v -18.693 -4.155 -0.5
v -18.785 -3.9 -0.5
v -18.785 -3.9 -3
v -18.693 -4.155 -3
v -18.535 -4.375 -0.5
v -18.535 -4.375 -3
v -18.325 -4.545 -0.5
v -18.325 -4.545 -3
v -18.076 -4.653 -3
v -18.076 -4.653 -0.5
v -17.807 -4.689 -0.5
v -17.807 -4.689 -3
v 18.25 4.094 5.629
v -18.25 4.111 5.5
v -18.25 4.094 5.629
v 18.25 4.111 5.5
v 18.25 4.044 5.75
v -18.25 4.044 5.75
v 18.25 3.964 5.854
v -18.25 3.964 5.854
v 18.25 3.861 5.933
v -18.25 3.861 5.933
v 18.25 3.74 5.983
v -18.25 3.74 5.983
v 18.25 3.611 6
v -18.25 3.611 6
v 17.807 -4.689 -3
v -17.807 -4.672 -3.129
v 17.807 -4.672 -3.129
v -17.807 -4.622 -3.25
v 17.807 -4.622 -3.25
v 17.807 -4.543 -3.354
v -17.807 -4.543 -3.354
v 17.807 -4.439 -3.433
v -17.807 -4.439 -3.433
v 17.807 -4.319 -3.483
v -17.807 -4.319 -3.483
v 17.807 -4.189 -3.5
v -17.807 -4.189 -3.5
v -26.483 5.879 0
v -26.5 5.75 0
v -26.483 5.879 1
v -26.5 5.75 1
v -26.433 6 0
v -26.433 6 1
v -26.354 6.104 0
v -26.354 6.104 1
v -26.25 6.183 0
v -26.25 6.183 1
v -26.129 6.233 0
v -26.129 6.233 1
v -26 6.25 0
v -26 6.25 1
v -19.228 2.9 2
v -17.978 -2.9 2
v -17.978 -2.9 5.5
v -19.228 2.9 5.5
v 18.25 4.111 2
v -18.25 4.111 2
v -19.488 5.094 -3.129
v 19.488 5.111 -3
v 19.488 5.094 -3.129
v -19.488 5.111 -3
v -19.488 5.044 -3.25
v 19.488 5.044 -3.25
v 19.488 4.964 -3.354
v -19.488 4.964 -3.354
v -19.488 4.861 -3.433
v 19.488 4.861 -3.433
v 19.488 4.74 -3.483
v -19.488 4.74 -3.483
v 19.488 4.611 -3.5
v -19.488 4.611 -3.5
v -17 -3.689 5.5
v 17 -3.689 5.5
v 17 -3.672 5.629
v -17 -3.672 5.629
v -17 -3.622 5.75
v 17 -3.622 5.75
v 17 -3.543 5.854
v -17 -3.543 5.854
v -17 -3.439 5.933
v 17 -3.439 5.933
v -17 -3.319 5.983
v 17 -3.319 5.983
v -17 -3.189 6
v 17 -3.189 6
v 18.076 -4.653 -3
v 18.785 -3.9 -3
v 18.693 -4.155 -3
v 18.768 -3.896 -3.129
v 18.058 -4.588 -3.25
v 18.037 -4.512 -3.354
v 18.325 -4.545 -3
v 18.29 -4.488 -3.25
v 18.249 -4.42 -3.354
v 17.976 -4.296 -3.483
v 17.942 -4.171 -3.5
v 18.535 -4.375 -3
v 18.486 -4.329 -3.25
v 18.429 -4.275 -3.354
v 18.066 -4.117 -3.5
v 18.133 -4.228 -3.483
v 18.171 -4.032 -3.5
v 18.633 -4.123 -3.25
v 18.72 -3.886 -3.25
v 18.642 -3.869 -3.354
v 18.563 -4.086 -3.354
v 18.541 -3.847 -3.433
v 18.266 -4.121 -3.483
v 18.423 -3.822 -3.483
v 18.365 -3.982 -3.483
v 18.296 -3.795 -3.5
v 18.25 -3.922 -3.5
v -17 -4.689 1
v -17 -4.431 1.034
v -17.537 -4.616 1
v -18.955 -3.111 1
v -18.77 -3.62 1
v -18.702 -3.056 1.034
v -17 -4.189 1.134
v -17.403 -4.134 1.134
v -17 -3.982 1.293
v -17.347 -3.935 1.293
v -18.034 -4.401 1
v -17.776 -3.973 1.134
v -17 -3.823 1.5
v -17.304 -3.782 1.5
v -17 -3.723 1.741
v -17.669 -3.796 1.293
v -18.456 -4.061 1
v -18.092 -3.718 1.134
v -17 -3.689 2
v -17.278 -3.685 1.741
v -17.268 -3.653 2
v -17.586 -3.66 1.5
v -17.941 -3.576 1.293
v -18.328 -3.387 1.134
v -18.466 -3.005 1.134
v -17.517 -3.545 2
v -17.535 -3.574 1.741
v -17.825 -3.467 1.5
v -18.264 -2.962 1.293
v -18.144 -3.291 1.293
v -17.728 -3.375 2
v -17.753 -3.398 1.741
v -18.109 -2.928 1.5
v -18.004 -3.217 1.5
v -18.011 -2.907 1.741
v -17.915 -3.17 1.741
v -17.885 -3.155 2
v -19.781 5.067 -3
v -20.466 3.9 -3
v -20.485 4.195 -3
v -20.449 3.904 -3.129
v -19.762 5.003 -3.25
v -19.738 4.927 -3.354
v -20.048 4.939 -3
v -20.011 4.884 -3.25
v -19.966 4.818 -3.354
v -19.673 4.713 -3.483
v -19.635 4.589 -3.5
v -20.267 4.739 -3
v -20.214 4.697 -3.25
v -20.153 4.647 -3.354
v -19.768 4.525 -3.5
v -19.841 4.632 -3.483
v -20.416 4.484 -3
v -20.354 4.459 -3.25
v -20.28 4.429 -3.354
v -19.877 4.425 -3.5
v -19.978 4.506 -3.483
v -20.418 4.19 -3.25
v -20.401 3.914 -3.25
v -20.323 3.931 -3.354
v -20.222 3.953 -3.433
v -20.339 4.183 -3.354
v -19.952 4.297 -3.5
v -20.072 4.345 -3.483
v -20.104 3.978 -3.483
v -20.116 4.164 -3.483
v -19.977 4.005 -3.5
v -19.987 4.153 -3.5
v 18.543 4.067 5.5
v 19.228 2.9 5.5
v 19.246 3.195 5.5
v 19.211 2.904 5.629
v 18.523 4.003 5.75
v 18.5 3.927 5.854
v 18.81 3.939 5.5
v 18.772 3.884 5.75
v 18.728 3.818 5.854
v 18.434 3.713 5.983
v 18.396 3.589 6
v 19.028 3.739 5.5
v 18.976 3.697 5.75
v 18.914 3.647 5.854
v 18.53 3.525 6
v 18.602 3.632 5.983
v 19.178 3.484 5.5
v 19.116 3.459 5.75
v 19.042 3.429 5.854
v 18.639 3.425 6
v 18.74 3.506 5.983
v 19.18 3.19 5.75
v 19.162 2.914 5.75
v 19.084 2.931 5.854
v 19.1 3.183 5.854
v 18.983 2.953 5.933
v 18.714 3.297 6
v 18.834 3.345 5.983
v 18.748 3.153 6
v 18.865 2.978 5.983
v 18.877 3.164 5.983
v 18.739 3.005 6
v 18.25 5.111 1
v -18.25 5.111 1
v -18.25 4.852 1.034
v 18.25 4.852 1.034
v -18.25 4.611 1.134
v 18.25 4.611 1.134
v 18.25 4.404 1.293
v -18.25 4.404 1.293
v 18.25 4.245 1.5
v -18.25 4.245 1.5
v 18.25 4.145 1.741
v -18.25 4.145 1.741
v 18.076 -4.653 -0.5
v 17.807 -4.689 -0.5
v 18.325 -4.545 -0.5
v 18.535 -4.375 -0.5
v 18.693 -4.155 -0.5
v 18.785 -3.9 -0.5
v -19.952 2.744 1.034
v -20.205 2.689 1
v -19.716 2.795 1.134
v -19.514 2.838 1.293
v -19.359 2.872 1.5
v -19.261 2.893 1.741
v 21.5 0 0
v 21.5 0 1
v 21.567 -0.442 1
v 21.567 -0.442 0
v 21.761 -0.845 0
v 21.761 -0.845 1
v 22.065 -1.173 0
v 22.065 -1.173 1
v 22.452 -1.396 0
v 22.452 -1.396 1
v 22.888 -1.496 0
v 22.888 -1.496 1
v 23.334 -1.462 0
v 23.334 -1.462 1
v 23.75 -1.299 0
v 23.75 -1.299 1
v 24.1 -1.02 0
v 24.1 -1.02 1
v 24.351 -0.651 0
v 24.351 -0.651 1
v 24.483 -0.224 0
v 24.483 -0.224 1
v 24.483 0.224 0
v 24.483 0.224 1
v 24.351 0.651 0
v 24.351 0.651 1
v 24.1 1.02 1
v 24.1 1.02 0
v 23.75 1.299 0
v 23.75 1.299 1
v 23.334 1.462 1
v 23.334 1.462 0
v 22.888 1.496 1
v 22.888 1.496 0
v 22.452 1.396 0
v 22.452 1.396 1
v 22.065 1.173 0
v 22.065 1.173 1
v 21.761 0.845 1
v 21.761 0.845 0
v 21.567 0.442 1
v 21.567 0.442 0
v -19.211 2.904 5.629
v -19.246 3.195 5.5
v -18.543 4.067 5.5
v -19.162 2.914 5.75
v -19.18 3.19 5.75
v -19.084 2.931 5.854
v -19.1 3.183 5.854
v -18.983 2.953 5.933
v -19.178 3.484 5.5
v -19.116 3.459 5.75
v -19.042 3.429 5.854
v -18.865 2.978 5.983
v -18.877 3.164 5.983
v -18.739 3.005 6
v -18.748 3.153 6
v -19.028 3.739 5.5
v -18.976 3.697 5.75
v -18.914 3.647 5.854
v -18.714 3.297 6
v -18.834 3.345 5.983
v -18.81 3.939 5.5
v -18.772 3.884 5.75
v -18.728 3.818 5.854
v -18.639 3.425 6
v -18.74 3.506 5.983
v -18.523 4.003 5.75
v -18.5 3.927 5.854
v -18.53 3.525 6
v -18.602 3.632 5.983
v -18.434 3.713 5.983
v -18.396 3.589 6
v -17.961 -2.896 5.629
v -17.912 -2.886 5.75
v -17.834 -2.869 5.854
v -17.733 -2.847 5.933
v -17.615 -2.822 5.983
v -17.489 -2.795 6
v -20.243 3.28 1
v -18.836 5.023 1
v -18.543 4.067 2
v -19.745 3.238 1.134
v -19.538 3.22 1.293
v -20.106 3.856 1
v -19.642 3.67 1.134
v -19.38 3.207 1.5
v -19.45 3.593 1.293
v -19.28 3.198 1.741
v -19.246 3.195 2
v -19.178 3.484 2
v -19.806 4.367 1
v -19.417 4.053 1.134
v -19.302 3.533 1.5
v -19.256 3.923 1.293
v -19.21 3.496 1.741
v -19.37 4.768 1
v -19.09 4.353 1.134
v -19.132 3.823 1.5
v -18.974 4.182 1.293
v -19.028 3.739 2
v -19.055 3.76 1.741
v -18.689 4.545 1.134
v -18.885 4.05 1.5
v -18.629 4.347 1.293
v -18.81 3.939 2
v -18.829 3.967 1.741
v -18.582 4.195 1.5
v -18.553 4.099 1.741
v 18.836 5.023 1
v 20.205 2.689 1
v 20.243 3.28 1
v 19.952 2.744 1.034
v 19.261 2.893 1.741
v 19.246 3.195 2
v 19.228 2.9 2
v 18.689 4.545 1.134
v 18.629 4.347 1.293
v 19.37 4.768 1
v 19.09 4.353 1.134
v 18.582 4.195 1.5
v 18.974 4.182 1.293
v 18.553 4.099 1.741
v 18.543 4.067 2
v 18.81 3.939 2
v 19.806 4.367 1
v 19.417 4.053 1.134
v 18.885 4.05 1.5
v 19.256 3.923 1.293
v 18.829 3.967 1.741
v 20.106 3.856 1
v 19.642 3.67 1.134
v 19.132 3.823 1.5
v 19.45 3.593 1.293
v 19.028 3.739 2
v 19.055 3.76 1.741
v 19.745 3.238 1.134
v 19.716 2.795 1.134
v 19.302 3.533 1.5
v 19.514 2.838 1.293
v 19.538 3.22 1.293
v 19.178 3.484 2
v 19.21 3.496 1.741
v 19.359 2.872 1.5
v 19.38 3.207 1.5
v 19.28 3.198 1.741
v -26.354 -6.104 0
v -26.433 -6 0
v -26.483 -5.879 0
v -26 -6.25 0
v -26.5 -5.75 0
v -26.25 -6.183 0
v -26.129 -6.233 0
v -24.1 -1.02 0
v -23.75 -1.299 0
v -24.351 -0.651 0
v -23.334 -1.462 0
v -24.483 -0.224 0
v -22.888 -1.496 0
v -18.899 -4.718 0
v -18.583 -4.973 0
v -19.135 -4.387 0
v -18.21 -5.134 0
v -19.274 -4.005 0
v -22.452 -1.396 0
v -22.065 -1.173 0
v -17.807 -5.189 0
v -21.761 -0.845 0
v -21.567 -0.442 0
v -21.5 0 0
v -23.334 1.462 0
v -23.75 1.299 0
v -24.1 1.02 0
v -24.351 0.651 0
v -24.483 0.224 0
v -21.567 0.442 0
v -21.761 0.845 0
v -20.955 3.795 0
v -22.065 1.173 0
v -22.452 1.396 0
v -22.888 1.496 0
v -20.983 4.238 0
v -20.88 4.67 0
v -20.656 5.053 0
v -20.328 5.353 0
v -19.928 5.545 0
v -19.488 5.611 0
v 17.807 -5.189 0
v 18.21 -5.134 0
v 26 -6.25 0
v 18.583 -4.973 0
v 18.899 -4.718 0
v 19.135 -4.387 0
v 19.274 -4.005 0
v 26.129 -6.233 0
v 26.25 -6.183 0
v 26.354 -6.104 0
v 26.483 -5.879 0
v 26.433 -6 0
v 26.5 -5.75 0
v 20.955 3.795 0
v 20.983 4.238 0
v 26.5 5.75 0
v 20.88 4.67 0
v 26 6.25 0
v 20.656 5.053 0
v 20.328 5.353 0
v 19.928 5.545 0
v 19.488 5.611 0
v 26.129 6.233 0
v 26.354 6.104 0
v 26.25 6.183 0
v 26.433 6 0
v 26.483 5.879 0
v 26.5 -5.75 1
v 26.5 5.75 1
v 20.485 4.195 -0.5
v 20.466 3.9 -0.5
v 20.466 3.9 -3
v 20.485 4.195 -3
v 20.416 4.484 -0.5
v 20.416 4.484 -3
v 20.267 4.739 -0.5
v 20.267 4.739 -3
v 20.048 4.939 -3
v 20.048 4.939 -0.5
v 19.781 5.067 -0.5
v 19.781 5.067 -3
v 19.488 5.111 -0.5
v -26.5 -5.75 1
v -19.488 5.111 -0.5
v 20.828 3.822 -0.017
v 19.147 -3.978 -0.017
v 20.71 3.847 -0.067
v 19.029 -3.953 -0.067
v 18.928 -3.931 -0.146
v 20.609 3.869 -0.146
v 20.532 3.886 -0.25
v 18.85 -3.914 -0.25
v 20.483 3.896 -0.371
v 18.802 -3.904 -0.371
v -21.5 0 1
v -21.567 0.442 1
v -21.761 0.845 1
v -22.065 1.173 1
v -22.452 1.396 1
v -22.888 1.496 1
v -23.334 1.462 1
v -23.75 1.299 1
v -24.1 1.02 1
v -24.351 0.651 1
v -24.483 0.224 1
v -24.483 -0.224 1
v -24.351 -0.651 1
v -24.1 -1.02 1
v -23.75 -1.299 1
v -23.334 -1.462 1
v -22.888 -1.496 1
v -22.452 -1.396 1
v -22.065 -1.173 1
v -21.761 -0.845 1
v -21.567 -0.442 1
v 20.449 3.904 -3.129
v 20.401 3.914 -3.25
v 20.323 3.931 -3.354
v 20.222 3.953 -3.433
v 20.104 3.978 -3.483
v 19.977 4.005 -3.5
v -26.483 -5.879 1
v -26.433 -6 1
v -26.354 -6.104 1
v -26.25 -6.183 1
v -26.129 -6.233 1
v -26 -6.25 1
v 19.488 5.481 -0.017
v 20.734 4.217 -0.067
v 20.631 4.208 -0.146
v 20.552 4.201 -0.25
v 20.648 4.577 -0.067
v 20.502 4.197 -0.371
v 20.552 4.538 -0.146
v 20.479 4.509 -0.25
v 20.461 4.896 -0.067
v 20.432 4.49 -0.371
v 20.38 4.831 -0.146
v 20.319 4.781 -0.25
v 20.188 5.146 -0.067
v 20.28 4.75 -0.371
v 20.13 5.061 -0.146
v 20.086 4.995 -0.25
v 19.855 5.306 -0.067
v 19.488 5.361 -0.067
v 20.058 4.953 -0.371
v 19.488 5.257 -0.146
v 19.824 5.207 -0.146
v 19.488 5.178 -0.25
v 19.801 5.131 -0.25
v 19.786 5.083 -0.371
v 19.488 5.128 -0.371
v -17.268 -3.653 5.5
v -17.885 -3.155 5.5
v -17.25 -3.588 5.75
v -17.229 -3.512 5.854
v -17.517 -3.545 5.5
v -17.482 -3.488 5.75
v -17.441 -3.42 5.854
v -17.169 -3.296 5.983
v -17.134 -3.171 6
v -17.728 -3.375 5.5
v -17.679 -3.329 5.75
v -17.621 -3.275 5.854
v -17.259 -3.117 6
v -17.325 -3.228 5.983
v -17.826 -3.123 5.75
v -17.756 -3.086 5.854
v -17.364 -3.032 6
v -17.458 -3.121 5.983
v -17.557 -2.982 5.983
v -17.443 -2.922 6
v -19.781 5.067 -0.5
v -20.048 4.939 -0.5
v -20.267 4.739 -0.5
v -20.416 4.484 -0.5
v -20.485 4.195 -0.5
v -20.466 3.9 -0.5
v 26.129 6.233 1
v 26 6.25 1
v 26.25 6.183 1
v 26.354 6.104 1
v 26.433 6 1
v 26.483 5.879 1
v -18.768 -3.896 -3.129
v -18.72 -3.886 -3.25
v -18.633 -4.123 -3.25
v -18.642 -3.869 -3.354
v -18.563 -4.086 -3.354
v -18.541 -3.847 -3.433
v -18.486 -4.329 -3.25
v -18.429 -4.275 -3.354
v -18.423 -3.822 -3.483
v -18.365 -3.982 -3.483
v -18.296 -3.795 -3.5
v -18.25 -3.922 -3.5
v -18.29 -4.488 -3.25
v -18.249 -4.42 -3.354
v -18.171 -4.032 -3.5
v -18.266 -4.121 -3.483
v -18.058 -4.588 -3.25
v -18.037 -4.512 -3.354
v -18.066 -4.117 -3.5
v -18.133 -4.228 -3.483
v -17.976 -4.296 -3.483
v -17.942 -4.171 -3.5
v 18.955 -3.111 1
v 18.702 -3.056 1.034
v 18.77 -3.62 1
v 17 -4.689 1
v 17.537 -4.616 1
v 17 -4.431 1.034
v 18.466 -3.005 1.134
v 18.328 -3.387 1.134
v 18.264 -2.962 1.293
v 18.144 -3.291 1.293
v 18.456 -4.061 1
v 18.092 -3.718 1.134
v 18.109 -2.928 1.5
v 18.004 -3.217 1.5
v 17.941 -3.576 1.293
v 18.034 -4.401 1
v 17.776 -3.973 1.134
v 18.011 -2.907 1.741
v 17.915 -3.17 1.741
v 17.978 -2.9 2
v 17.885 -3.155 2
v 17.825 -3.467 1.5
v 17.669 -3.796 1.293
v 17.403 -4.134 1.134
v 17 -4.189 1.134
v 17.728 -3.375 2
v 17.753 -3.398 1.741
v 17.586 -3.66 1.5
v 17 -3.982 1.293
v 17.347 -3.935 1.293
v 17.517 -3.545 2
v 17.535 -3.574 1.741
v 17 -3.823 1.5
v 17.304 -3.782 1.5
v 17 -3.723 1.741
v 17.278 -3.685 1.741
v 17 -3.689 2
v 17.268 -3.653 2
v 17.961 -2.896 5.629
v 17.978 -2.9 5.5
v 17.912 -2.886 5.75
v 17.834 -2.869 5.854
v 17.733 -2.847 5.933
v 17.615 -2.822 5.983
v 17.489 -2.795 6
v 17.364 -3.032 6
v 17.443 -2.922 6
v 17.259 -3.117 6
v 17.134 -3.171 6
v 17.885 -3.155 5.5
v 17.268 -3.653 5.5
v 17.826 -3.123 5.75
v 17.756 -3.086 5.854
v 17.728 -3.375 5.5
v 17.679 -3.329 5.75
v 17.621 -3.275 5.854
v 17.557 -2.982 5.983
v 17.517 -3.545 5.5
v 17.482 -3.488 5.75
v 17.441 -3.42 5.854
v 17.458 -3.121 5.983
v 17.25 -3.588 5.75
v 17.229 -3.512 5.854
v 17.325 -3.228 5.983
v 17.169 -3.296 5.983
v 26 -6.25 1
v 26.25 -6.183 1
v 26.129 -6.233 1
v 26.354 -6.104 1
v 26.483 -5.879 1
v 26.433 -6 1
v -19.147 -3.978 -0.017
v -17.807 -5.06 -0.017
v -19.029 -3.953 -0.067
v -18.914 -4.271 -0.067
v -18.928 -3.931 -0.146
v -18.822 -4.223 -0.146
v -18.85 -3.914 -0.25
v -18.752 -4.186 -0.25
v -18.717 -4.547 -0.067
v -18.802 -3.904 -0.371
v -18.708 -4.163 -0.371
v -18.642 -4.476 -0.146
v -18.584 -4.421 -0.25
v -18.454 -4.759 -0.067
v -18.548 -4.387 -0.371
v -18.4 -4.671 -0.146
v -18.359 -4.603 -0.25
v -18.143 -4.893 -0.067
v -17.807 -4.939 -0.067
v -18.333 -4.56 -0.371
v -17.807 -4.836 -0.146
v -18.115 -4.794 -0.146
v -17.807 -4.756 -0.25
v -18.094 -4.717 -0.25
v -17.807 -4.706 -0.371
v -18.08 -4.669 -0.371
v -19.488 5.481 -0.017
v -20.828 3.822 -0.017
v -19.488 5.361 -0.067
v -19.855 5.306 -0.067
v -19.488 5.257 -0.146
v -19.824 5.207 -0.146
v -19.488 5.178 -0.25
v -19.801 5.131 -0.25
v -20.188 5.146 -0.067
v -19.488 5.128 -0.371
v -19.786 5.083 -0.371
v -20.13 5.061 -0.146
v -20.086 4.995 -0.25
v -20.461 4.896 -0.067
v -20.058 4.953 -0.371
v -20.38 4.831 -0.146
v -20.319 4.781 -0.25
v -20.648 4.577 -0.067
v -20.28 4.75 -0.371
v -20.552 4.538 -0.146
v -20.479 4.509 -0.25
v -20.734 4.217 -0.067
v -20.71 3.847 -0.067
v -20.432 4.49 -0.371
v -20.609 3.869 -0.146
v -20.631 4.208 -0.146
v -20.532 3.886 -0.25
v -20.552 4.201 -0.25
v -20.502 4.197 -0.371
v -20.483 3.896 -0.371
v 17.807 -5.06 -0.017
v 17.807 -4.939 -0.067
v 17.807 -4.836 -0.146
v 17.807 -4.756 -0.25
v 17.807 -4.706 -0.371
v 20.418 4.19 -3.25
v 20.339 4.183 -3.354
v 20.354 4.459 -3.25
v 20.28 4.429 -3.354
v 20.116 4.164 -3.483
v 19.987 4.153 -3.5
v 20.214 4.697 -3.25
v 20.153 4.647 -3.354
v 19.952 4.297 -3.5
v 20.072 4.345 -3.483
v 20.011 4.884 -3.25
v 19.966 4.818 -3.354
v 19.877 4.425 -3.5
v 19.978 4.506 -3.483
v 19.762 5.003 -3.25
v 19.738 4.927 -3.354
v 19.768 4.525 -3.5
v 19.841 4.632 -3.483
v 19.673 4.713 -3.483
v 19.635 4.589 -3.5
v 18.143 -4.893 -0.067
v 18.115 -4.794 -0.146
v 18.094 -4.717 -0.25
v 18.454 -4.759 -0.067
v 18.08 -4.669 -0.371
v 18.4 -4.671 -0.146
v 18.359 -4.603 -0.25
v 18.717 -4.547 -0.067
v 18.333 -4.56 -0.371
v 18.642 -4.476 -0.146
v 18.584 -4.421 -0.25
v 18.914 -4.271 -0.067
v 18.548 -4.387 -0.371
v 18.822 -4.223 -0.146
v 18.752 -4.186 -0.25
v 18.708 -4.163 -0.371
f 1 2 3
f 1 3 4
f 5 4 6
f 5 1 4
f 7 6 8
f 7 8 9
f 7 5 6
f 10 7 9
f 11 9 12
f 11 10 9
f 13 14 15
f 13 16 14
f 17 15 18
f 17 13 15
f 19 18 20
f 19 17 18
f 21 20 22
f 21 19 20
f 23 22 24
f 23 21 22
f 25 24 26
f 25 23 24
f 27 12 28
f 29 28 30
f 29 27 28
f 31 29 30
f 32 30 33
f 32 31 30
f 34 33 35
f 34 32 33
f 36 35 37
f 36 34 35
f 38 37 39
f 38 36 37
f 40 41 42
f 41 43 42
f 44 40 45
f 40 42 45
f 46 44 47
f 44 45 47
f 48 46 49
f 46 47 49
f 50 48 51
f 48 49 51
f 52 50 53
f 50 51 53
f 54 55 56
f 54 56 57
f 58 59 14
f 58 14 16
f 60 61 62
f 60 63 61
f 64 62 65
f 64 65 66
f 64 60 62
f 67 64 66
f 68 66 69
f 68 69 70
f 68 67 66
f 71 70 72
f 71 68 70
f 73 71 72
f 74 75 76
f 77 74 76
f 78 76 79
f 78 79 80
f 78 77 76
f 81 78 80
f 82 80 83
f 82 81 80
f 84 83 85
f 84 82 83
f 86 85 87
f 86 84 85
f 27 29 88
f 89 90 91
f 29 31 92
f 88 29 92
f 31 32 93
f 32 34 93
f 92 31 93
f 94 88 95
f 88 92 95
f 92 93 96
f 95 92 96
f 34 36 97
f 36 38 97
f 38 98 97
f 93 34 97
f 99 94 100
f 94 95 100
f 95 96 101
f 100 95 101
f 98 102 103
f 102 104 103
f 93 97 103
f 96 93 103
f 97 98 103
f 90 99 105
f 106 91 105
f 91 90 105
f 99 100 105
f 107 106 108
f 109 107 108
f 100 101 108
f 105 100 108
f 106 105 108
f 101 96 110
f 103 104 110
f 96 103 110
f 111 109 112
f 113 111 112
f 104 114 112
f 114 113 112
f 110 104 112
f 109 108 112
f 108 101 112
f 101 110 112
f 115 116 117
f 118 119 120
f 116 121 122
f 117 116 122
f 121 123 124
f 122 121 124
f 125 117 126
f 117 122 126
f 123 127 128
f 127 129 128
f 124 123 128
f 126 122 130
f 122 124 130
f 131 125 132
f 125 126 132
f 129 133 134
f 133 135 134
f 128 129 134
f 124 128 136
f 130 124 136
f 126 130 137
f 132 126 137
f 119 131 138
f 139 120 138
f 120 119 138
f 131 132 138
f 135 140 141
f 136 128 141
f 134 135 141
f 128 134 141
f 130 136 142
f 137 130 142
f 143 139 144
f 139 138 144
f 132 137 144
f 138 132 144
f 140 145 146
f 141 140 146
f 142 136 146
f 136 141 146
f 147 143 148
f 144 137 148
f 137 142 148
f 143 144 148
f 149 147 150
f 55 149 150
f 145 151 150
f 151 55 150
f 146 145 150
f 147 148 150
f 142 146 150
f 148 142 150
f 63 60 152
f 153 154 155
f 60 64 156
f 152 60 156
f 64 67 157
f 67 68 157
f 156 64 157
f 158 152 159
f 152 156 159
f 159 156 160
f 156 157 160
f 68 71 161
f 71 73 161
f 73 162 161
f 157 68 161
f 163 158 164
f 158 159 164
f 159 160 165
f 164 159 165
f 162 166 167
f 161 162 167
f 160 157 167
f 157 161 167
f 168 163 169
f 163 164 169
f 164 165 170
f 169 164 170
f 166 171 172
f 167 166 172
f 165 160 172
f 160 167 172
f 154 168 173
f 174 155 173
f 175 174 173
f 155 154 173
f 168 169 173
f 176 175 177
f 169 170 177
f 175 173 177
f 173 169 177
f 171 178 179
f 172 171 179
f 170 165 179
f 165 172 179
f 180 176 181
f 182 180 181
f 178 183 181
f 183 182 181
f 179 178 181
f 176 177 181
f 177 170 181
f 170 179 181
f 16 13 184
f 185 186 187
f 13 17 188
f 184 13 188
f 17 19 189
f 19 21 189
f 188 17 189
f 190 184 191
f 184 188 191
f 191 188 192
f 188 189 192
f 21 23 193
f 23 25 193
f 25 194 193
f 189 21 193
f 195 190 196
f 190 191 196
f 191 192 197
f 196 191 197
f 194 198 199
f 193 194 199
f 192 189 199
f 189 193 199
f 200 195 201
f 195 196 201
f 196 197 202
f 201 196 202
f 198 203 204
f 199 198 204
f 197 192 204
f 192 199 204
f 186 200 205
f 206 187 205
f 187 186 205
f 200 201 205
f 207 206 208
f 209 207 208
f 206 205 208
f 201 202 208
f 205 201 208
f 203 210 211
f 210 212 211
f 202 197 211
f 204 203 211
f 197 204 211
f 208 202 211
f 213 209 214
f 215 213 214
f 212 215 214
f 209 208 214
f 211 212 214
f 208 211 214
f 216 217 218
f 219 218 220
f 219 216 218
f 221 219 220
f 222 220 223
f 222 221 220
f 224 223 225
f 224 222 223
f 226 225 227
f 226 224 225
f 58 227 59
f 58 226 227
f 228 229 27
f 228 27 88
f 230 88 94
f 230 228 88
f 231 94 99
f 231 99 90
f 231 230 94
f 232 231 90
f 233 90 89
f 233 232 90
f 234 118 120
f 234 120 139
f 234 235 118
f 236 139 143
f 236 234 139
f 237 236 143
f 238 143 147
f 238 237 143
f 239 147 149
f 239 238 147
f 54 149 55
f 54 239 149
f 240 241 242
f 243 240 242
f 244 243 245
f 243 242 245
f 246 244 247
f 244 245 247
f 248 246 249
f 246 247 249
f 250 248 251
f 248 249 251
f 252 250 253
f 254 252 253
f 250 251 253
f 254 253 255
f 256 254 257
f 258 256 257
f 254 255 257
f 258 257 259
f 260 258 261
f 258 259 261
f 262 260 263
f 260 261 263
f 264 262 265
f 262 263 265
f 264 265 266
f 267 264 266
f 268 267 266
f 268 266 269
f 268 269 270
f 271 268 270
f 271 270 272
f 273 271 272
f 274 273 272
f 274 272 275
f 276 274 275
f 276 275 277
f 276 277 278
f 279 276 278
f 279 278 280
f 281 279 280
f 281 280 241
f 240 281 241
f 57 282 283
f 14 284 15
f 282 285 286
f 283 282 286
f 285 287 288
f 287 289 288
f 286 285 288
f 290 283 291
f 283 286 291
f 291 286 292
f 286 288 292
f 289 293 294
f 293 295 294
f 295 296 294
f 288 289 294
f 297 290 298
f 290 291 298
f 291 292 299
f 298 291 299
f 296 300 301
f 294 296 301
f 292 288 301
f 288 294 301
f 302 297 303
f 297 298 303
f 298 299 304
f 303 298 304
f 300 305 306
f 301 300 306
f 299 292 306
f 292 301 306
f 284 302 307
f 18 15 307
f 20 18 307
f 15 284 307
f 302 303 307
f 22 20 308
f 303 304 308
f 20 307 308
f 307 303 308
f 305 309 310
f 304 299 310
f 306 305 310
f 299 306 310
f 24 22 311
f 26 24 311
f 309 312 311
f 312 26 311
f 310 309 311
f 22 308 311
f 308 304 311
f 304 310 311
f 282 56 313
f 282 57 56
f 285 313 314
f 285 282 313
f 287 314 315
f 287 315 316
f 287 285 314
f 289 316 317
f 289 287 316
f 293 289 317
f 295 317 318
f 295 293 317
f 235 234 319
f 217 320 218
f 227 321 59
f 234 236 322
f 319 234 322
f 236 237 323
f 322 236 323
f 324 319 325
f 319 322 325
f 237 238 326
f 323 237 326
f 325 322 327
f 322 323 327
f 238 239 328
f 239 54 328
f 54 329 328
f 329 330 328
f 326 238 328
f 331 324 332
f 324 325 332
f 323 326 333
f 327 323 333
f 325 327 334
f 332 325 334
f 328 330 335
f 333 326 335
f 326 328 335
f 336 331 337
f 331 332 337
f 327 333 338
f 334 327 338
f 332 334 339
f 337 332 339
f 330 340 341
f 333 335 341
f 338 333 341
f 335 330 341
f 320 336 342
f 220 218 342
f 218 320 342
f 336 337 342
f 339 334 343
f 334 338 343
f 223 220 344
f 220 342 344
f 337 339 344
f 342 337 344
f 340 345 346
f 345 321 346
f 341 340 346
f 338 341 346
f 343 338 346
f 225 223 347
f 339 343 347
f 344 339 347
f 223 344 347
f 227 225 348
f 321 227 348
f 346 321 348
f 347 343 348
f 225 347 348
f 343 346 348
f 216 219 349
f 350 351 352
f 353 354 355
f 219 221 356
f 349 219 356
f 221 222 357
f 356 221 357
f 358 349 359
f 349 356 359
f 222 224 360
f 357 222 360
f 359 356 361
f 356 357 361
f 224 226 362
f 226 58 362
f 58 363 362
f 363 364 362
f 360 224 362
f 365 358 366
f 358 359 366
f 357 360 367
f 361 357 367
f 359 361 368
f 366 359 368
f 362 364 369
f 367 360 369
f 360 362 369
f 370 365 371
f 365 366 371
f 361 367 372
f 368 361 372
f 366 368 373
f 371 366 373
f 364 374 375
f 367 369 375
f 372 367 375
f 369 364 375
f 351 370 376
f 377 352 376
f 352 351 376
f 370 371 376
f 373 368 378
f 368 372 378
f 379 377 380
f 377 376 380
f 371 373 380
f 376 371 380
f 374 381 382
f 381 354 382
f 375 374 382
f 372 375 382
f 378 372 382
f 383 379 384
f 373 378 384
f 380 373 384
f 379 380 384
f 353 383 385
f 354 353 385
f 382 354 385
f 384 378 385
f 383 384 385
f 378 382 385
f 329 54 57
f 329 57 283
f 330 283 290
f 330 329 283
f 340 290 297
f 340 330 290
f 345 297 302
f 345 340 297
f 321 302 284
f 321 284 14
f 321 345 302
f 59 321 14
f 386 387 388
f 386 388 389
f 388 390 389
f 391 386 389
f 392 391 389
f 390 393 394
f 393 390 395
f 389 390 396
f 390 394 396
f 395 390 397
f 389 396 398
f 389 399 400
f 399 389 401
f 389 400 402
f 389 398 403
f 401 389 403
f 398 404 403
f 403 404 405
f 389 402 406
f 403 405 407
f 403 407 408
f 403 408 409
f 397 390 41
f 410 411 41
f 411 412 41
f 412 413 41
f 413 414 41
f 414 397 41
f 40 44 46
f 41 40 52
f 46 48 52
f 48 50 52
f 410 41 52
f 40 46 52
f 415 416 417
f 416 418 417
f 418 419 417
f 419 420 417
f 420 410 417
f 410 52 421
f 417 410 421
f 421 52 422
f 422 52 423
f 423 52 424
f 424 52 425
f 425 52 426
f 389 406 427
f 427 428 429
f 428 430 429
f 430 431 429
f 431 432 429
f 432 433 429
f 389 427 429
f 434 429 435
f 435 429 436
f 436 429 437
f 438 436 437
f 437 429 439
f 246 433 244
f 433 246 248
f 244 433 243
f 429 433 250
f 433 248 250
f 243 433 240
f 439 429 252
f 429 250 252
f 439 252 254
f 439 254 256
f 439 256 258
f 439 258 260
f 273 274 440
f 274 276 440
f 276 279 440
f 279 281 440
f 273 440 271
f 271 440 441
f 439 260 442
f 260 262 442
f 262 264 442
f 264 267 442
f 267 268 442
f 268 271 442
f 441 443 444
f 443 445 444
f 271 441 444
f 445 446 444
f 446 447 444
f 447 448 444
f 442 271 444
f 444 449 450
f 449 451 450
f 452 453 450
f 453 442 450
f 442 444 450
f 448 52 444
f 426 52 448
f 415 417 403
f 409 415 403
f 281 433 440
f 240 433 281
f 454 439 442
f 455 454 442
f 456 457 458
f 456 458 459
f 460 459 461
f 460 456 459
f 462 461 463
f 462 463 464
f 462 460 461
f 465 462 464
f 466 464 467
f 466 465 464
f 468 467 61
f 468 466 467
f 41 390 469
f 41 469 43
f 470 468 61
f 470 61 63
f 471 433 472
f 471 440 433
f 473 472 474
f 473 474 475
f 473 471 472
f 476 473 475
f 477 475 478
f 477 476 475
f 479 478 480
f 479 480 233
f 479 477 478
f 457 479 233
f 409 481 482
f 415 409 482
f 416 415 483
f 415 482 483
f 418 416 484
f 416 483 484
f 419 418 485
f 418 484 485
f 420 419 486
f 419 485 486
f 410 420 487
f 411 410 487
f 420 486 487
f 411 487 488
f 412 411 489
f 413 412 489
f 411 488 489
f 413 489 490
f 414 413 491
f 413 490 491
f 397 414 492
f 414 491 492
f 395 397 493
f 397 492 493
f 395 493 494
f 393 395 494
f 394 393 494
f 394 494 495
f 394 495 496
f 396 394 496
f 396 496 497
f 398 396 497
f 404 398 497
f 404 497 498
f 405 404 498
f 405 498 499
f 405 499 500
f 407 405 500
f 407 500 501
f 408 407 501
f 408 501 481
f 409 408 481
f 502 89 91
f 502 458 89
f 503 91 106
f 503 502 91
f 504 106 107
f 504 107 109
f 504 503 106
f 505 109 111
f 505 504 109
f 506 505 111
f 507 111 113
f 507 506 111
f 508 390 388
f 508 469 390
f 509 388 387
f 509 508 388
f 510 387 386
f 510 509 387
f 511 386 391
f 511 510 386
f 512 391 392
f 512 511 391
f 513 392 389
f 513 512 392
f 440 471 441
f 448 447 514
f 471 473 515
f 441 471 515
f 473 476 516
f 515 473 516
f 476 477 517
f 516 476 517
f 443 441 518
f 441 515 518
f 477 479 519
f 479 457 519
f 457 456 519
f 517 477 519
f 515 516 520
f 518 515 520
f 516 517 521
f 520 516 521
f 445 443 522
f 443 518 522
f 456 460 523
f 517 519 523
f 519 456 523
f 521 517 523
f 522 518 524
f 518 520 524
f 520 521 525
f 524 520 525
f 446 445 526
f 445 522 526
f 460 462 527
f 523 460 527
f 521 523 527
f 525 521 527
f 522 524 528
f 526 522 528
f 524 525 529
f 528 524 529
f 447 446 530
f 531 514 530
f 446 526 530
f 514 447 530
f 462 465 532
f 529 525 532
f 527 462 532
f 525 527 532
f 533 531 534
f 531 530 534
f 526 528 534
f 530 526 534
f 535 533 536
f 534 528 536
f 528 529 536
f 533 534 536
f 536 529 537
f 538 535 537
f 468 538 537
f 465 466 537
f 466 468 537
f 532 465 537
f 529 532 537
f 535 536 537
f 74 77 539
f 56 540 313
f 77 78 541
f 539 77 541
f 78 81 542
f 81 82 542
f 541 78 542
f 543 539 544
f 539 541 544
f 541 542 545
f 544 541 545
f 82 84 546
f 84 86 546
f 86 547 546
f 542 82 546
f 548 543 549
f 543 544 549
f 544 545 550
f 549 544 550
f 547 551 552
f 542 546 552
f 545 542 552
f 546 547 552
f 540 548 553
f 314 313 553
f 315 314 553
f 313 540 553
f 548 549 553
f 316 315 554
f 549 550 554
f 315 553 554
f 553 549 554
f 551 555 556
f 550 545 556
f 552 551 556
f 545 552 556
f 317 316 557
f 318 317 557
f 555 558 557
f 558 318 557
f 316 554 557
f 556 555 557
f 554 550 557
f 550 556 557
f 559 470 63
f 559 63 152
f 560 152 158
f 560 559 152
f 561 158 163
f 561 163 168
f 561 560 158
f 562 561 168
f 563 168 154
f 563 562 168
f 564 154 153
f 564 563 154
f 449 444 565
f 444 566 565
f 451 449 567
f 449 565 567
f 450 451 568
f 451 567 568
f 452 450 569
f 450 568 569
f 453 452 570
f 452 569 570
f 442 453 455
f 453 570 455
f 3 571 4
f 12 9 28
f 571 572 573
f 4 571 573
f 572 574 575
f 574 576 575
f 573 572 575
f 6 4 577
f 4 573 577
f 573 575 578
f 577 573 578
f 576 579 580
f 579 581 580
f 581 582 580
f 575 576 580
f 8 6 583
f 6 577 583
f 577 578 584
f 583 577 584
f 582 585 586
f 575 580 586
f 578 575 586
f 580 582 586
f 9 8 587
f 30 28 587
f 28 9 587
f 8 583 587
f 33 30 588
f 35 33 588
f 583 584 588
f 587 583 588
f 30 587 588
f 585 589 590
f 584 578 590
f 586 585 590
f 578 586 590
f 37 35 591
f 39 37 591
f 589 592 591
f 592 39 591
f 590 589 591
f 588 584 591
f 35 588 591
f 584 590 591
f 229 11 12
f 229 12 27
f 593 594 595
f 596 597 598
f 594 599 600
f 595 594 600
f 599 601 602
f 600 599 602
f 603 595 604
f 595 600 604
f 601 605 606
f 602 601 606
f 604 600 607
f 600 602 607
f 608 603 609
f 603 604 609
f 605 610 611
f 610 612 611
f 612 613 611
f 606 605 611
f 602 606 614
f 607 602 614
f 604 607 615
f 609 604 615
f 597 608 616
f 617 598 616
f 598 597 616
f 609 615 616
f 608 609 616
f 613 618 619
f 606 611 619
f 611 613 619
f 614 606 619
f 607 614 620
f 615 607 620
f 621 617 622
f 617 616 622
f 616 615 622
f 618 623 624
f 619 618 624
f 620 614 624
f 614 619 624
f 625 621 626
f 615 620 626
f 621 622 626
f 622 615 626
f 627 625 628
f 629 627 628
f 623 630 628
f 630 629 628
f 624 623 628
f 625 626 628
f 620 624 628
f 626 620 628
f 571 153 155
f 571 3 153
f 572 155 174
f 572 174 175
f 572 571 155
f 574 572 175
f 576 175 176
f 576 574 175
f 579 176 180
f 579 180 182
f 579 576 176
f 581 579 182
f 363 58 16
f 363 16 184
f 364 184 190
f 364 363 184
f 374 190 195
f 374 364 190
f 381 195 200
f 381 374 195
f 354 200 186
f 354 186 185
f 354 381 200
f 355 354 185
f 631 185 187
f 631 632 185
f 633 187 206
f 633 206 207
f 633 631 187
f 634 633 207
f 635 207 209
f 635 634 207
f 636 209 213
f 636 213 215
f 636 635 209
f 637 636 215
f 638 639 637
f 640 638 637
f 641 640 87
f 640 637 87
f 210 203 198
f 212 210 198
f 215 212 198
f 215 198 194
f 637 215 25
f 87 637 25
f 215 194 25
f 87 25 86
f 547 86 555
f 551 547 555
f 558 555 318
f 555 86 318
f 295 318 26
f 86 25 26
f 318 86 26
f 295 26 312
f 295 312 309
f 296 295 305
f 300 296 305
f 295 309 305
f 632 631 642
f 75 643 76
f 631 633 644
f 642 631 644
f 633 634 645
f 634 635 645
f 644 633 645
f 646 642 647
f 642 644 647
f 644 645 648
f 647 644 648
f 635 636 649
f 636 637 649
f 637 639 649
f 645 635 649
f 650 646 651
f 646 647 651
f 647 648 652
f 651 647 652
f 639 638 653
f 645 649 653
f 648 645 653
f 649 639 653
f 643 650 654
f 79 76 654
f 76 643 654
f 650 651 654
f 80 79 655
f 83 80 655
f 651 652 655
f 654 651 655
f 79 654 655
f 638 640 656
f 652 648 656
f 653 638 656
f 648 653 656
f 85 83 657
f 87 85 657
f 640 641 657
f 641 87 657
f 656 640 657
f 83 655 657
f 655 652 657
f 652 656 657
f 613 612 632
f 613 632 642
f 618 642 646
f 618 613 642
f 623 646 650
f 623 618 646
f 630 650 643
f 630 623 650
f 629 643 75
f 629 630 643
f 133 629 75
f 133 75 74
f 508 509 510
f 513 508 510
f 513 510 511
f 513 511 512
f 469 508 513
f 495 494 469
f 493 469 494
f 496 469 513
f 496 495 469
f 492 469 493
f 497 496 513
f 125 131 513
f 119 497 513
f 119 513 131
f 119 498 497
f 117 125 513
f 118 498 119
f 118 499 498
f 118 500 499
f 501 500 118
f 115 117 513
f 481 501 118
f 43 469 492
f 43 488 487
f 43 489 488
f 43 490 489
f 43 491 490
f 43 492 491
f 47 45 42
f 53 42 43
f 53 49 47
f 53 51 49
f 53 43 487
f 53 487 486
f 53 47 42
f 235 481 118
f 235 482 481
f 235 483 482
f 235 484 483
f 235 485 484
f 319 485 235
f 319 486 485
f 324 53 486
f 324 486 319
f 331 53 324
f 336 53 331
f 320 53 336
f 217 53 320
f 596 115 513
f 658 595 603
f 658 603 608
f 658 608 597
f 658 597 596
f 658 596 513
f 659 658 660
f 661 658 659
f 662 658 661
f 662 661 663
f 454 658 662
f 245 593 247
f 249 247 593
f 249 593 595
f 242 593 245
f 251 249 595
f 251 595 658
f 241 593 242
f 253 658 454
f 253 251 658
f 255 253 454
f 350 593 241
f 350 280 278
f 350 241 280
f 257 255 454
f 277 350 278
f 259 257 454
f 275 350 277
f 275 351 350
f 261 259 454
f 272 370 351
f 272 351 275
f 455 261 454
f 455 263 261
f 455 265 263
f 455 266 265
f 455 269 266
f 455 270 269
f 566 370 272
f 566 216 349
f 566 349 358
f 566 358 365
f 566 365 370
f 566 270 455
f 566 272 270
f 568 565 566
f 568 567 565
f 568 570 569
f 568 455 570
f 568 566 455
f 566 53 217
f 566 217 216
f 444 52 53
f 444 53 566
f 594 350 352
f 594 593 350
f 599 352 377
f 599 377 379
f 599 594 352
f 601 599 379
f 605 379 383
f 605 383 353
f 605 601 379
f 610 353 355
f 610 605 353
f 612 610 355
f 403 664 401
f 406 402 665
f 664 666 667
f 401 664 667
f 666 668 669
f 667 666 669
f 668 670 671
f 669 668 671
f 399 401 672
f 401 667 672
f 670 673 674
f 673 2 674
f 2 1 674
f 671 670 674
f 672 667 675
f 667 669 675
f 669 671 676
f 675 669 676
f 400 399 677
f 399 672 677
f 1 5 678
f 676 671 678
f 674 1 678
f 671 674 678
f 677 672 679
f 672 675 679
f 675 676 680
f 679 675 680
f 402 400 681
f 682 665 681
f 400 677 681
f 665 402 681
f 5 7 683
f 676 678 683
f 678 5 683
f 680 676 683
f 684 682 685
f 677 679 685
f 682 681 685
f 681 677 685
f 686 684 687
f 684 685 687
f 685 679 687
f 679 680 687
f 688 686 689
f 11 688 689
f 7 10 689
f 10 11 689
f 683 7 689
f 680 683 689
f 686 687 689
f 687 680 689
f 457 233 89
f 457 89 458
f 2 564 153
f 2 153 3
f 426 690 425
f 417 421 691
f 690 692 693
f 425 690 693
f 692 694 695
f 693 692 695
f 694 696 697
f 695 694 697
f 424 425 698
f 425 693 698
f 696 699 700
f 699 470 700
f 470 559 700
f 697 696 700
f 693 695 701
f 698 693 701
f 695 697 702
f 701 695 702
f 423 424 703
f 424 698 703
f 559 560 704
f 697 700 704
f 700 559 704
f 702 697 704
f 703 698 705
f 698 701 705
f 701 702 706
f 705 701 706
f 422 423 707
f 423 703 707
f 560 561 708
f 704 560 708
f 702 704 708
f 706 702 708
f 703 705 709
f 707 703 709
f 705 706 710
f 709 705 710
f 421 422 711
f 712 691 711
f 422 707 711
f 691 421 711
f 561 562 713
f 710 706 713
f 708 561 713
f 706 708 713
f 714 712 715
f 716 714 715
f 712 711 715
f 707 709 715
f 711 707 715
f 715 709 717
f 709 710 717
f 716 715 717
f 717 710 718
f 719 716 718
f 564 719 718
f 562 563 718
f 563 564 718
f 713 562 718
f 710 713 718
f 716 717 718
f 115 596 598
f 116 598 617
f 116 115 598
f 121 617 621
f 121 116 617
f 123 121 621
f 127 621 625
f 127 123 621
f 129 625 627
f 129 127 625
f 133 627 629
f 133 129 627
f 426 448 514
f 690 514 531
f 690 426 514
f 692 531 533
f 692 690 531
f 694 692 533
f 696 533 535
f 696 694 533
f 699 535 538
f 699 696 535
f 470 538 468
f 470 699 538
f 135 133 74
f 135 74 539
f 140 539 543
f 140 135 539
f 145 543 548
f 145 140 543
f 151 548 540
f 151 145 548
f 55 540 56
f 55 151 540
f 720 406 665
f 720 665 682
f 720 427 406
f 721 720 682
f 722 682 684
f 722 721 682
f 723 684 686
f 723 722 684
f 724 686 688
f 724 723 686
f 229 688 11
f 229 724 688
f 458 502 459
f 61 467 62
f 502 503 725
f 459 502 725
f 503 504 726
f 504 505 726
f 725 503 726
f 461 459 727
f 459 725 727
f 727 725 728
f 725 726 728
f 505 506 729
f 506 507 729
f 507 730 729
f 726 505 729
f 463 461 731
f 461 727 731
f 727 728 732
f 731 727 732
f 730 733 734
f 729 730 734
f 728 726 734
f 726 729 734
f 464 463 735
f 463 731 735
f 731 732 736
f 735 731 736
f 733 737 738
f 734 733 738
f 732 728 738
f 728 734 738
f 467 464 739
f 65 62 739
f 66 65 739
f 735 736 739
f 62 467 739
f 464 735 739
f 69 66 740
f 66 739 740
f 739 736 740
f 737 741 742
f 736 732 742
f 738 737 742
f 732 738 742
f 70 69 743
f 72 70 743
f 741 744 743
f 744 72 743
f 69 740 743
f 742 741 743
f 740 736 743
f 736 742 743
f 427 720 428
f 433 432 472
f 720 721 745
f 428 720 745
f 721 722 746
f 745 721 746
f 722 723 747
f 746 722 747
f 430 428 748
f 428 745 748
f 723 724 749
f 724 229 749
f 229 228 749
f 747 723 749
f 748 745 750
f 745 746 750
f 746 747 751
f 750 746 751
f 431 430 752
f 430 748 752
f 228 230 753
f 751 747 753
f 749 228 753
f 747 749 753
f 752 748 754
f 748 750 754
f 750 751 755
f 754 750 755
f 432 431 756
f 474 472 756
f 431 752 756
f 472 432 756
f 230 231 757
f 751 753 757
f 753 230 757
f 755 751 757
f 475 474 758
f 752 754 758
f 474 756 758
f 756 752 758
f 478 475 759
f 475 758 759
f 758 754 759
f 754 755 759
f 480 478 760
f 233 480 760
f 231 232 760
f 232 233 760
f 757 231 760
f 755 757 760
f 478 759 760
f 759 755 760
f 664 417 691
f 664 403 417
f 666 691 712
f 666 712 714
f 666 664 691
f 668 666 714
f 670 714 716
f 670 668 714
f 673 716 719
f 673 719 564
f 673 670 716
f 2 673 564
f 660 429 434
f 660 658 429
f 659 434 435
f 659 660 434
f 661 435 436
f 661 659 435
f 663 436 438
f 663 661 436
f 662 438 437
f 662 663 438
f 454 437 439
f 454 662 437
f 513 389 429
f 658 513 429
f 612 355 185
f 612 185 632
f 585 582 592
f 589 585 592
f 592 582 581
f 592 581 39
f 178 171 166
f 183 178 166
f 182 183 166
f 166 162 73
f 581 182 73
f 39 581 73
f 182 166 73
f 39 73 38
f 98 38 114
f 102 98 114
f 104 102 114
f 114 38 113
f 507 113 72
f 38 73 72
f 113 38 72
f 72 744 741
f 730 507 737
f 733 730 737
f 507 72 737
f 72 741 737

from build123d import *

# Parameters (mm, degrees)
SKETCH1_W           = 53
SKETCH1_H           = 12.5
BOSS_EXTRUDE1_DEPTH = 1
BOSS_EXTRUDE2_DEPTH = 5
SKETCH3_R           = 1.5
CUT_EXTRUDE1_DEPTH  = 28.682349973
FILLET1_R           = 1
FILLET2_R           = 0.5
BOSS_EXTRUDE3_DEPTH = 3.5
FILLET3_R           = 0.5


with BuildPart() as part:
    # Sketch1 → Boss-Extrude1 (new body)
    with BuildSketch(Plane.XY):
        Rectangle(SKETCH1_W, SKETCH1_H)
    extrude(amount=BOSS_EXTRUDE1_DEPTH)

    # Sketch2 → Boss-Extrude2 (add)
    with BuildSketch(Plane.XY.offset(1)):
        with BuildLine():
            Line((19.227555087, 2.9), (17.977555087, -2.9))
            ThreePointArc((17.977555087, -2.9), (17.628219716, -3.467356005), (17, -3.689320024))
            Line((17, -3.689320024), (-17, -3.689320024))
            ThreePointArc((-17, -3.689320024), (-17.628219716, -3.467356005), (-17.977555087, -2.9))
            Line((-17.977555087, -2.9), (-19.227555087, 2.9))
            ThreePointArc((-19.227555087, 2.9), (-19.028035981, 3.738899692), (-18.25, 4.110679976))
            Line((-18.25, 4.110679976), (18.25, 4.110679976))
            ThreePointArc((18.25, 4.110679976), (19.028035981, 3.738899692), (19.227555087, 2.9))
        make_face()
    extrude(amount=BOSS_EXTRUDE2_DEPTH)

    # Sketch3 → Cut-Extrude1 (cut, through all)
    with BuildSketch(Plane.XY.offset(1)):
        with Locations((-23, 0)):
            Circle(SKETCH3_R)
        with Locations(Location((23, 0, 0), (0, 0, 180))):
            Circle(SKETCH3_R)
    extrude(amount=-CUT_EXTRUDE1_DEPTH, mode=Mode.SUBTRACT)

    # Fillet1
    fillet1_edges = [part.edges().sort_by_distance(p)[0] for p in [
        (17.628219716, -3.467356005, 1),
        (18.602555087, 0, 1),
        (19.028035981, 3.738899692, 1),
        (0, 4.110679976, 1),
        (-19.028035981, 3.738899692, 1),
        (-18.602555087, 0, 1),
        (-17.628219716, -3.467356005, 1),
        (0, -3.689320024, 1),
    ]]
    fillet(fillet1_edges, radius=FILLET1_R)

    # Fillet2
    fillet2_edges = [part.edges().sort_by_distance(p)[0] for p in [
        (17.628219716, -3.467356005, 6),
        (18.602555087, 0, 6),
        (19.028035981, 3.738899692, 6),
        (0, 4.110679976, 6),
        (-19.028035981, 3.738899692, 6),
        (-18.602555087, 0, 6),
        (-17.628219716, -3.467356005, 6),
        (0, -3.689320024, 6),
        (26.5, -6.25, 0.5),
        (-26.5, -6.25, 0.5),
        (-26.5, 6.25, 0.5),
        (26.5, 6.25, 0.5),
    ]]
    fillet(fillet2_edges, radius=FILLET2_R)

    # Sketch5 → Boss-Extrude3 (add)
    with BuildSketch(Plane(origin=(0, 0, 0), x_dir=(-1, 0, 0), z_dir=(0, 0, -1))):
        with BuildLine():
            Line((-19.488477495, 5.110679976), (19.488477495, 5.110679976))
            ThreePointArc((19.488477495, 5.110679976), (20.266513476, 4.738899692), (20.466032582, 3.9))
            Line((20.466032582, 3.9), (18.7849981, -3.9))
            ThreePointArc((18.7849981, -3.9), (18.435662729, -4.467356005), (17.807443013, -4.689320024))
            Line((17.807443013, -4.689320024), (-17.807443013, -4.689320024))
            ThreePointArc((-17.807443013, -4.689320024), (-18.435662729, -4.467356005), (-18.7849981, -3.9))
            Line((-18.7849981, -3.9), (-20.466032582, 3.9))
            ThreePointArc((-20.466032582, 3.9), (-20.266513476, 4.738899692), (-19.488477495, 5.110679976))
        make_face()
    extrude(amount=BOSS_EXTRUDE3_DEPTH)

    # Fillet3
    fillet3_edges = [part.edges().sort_by_distance(p)[0] for p in [
        (18.435662729, -4.467356005, 0),
        (0, -4.689320024, 0),
        (-18.435662729, -4.467356005, 0),
        (-19.625515341, 0, 0),
        (-20.266513476, 4.738899692, 0),
        (0, 5.110679976, 0),
        (20.266513476, 4.738899692, 0),
        (19.625515341, 0, 0),
        (18.435662729, -4.467356005, -3.5),
        (0, -4.689320024, -3.5),
        (-18.435662729, -4.467356005, -3.5),
        (-19.625515341, 0, -3.5),
        (-20.266513476, 4.738899692, -3.5),
        (0, 5.110679976, -3.5),
        (20.266513476, 4.738899692, -3.5),
        (19.625515341, 0, -3.5),
    ]]
    fillet(fillet3_edges, radius=FILLET3_R)


solid = part.part
